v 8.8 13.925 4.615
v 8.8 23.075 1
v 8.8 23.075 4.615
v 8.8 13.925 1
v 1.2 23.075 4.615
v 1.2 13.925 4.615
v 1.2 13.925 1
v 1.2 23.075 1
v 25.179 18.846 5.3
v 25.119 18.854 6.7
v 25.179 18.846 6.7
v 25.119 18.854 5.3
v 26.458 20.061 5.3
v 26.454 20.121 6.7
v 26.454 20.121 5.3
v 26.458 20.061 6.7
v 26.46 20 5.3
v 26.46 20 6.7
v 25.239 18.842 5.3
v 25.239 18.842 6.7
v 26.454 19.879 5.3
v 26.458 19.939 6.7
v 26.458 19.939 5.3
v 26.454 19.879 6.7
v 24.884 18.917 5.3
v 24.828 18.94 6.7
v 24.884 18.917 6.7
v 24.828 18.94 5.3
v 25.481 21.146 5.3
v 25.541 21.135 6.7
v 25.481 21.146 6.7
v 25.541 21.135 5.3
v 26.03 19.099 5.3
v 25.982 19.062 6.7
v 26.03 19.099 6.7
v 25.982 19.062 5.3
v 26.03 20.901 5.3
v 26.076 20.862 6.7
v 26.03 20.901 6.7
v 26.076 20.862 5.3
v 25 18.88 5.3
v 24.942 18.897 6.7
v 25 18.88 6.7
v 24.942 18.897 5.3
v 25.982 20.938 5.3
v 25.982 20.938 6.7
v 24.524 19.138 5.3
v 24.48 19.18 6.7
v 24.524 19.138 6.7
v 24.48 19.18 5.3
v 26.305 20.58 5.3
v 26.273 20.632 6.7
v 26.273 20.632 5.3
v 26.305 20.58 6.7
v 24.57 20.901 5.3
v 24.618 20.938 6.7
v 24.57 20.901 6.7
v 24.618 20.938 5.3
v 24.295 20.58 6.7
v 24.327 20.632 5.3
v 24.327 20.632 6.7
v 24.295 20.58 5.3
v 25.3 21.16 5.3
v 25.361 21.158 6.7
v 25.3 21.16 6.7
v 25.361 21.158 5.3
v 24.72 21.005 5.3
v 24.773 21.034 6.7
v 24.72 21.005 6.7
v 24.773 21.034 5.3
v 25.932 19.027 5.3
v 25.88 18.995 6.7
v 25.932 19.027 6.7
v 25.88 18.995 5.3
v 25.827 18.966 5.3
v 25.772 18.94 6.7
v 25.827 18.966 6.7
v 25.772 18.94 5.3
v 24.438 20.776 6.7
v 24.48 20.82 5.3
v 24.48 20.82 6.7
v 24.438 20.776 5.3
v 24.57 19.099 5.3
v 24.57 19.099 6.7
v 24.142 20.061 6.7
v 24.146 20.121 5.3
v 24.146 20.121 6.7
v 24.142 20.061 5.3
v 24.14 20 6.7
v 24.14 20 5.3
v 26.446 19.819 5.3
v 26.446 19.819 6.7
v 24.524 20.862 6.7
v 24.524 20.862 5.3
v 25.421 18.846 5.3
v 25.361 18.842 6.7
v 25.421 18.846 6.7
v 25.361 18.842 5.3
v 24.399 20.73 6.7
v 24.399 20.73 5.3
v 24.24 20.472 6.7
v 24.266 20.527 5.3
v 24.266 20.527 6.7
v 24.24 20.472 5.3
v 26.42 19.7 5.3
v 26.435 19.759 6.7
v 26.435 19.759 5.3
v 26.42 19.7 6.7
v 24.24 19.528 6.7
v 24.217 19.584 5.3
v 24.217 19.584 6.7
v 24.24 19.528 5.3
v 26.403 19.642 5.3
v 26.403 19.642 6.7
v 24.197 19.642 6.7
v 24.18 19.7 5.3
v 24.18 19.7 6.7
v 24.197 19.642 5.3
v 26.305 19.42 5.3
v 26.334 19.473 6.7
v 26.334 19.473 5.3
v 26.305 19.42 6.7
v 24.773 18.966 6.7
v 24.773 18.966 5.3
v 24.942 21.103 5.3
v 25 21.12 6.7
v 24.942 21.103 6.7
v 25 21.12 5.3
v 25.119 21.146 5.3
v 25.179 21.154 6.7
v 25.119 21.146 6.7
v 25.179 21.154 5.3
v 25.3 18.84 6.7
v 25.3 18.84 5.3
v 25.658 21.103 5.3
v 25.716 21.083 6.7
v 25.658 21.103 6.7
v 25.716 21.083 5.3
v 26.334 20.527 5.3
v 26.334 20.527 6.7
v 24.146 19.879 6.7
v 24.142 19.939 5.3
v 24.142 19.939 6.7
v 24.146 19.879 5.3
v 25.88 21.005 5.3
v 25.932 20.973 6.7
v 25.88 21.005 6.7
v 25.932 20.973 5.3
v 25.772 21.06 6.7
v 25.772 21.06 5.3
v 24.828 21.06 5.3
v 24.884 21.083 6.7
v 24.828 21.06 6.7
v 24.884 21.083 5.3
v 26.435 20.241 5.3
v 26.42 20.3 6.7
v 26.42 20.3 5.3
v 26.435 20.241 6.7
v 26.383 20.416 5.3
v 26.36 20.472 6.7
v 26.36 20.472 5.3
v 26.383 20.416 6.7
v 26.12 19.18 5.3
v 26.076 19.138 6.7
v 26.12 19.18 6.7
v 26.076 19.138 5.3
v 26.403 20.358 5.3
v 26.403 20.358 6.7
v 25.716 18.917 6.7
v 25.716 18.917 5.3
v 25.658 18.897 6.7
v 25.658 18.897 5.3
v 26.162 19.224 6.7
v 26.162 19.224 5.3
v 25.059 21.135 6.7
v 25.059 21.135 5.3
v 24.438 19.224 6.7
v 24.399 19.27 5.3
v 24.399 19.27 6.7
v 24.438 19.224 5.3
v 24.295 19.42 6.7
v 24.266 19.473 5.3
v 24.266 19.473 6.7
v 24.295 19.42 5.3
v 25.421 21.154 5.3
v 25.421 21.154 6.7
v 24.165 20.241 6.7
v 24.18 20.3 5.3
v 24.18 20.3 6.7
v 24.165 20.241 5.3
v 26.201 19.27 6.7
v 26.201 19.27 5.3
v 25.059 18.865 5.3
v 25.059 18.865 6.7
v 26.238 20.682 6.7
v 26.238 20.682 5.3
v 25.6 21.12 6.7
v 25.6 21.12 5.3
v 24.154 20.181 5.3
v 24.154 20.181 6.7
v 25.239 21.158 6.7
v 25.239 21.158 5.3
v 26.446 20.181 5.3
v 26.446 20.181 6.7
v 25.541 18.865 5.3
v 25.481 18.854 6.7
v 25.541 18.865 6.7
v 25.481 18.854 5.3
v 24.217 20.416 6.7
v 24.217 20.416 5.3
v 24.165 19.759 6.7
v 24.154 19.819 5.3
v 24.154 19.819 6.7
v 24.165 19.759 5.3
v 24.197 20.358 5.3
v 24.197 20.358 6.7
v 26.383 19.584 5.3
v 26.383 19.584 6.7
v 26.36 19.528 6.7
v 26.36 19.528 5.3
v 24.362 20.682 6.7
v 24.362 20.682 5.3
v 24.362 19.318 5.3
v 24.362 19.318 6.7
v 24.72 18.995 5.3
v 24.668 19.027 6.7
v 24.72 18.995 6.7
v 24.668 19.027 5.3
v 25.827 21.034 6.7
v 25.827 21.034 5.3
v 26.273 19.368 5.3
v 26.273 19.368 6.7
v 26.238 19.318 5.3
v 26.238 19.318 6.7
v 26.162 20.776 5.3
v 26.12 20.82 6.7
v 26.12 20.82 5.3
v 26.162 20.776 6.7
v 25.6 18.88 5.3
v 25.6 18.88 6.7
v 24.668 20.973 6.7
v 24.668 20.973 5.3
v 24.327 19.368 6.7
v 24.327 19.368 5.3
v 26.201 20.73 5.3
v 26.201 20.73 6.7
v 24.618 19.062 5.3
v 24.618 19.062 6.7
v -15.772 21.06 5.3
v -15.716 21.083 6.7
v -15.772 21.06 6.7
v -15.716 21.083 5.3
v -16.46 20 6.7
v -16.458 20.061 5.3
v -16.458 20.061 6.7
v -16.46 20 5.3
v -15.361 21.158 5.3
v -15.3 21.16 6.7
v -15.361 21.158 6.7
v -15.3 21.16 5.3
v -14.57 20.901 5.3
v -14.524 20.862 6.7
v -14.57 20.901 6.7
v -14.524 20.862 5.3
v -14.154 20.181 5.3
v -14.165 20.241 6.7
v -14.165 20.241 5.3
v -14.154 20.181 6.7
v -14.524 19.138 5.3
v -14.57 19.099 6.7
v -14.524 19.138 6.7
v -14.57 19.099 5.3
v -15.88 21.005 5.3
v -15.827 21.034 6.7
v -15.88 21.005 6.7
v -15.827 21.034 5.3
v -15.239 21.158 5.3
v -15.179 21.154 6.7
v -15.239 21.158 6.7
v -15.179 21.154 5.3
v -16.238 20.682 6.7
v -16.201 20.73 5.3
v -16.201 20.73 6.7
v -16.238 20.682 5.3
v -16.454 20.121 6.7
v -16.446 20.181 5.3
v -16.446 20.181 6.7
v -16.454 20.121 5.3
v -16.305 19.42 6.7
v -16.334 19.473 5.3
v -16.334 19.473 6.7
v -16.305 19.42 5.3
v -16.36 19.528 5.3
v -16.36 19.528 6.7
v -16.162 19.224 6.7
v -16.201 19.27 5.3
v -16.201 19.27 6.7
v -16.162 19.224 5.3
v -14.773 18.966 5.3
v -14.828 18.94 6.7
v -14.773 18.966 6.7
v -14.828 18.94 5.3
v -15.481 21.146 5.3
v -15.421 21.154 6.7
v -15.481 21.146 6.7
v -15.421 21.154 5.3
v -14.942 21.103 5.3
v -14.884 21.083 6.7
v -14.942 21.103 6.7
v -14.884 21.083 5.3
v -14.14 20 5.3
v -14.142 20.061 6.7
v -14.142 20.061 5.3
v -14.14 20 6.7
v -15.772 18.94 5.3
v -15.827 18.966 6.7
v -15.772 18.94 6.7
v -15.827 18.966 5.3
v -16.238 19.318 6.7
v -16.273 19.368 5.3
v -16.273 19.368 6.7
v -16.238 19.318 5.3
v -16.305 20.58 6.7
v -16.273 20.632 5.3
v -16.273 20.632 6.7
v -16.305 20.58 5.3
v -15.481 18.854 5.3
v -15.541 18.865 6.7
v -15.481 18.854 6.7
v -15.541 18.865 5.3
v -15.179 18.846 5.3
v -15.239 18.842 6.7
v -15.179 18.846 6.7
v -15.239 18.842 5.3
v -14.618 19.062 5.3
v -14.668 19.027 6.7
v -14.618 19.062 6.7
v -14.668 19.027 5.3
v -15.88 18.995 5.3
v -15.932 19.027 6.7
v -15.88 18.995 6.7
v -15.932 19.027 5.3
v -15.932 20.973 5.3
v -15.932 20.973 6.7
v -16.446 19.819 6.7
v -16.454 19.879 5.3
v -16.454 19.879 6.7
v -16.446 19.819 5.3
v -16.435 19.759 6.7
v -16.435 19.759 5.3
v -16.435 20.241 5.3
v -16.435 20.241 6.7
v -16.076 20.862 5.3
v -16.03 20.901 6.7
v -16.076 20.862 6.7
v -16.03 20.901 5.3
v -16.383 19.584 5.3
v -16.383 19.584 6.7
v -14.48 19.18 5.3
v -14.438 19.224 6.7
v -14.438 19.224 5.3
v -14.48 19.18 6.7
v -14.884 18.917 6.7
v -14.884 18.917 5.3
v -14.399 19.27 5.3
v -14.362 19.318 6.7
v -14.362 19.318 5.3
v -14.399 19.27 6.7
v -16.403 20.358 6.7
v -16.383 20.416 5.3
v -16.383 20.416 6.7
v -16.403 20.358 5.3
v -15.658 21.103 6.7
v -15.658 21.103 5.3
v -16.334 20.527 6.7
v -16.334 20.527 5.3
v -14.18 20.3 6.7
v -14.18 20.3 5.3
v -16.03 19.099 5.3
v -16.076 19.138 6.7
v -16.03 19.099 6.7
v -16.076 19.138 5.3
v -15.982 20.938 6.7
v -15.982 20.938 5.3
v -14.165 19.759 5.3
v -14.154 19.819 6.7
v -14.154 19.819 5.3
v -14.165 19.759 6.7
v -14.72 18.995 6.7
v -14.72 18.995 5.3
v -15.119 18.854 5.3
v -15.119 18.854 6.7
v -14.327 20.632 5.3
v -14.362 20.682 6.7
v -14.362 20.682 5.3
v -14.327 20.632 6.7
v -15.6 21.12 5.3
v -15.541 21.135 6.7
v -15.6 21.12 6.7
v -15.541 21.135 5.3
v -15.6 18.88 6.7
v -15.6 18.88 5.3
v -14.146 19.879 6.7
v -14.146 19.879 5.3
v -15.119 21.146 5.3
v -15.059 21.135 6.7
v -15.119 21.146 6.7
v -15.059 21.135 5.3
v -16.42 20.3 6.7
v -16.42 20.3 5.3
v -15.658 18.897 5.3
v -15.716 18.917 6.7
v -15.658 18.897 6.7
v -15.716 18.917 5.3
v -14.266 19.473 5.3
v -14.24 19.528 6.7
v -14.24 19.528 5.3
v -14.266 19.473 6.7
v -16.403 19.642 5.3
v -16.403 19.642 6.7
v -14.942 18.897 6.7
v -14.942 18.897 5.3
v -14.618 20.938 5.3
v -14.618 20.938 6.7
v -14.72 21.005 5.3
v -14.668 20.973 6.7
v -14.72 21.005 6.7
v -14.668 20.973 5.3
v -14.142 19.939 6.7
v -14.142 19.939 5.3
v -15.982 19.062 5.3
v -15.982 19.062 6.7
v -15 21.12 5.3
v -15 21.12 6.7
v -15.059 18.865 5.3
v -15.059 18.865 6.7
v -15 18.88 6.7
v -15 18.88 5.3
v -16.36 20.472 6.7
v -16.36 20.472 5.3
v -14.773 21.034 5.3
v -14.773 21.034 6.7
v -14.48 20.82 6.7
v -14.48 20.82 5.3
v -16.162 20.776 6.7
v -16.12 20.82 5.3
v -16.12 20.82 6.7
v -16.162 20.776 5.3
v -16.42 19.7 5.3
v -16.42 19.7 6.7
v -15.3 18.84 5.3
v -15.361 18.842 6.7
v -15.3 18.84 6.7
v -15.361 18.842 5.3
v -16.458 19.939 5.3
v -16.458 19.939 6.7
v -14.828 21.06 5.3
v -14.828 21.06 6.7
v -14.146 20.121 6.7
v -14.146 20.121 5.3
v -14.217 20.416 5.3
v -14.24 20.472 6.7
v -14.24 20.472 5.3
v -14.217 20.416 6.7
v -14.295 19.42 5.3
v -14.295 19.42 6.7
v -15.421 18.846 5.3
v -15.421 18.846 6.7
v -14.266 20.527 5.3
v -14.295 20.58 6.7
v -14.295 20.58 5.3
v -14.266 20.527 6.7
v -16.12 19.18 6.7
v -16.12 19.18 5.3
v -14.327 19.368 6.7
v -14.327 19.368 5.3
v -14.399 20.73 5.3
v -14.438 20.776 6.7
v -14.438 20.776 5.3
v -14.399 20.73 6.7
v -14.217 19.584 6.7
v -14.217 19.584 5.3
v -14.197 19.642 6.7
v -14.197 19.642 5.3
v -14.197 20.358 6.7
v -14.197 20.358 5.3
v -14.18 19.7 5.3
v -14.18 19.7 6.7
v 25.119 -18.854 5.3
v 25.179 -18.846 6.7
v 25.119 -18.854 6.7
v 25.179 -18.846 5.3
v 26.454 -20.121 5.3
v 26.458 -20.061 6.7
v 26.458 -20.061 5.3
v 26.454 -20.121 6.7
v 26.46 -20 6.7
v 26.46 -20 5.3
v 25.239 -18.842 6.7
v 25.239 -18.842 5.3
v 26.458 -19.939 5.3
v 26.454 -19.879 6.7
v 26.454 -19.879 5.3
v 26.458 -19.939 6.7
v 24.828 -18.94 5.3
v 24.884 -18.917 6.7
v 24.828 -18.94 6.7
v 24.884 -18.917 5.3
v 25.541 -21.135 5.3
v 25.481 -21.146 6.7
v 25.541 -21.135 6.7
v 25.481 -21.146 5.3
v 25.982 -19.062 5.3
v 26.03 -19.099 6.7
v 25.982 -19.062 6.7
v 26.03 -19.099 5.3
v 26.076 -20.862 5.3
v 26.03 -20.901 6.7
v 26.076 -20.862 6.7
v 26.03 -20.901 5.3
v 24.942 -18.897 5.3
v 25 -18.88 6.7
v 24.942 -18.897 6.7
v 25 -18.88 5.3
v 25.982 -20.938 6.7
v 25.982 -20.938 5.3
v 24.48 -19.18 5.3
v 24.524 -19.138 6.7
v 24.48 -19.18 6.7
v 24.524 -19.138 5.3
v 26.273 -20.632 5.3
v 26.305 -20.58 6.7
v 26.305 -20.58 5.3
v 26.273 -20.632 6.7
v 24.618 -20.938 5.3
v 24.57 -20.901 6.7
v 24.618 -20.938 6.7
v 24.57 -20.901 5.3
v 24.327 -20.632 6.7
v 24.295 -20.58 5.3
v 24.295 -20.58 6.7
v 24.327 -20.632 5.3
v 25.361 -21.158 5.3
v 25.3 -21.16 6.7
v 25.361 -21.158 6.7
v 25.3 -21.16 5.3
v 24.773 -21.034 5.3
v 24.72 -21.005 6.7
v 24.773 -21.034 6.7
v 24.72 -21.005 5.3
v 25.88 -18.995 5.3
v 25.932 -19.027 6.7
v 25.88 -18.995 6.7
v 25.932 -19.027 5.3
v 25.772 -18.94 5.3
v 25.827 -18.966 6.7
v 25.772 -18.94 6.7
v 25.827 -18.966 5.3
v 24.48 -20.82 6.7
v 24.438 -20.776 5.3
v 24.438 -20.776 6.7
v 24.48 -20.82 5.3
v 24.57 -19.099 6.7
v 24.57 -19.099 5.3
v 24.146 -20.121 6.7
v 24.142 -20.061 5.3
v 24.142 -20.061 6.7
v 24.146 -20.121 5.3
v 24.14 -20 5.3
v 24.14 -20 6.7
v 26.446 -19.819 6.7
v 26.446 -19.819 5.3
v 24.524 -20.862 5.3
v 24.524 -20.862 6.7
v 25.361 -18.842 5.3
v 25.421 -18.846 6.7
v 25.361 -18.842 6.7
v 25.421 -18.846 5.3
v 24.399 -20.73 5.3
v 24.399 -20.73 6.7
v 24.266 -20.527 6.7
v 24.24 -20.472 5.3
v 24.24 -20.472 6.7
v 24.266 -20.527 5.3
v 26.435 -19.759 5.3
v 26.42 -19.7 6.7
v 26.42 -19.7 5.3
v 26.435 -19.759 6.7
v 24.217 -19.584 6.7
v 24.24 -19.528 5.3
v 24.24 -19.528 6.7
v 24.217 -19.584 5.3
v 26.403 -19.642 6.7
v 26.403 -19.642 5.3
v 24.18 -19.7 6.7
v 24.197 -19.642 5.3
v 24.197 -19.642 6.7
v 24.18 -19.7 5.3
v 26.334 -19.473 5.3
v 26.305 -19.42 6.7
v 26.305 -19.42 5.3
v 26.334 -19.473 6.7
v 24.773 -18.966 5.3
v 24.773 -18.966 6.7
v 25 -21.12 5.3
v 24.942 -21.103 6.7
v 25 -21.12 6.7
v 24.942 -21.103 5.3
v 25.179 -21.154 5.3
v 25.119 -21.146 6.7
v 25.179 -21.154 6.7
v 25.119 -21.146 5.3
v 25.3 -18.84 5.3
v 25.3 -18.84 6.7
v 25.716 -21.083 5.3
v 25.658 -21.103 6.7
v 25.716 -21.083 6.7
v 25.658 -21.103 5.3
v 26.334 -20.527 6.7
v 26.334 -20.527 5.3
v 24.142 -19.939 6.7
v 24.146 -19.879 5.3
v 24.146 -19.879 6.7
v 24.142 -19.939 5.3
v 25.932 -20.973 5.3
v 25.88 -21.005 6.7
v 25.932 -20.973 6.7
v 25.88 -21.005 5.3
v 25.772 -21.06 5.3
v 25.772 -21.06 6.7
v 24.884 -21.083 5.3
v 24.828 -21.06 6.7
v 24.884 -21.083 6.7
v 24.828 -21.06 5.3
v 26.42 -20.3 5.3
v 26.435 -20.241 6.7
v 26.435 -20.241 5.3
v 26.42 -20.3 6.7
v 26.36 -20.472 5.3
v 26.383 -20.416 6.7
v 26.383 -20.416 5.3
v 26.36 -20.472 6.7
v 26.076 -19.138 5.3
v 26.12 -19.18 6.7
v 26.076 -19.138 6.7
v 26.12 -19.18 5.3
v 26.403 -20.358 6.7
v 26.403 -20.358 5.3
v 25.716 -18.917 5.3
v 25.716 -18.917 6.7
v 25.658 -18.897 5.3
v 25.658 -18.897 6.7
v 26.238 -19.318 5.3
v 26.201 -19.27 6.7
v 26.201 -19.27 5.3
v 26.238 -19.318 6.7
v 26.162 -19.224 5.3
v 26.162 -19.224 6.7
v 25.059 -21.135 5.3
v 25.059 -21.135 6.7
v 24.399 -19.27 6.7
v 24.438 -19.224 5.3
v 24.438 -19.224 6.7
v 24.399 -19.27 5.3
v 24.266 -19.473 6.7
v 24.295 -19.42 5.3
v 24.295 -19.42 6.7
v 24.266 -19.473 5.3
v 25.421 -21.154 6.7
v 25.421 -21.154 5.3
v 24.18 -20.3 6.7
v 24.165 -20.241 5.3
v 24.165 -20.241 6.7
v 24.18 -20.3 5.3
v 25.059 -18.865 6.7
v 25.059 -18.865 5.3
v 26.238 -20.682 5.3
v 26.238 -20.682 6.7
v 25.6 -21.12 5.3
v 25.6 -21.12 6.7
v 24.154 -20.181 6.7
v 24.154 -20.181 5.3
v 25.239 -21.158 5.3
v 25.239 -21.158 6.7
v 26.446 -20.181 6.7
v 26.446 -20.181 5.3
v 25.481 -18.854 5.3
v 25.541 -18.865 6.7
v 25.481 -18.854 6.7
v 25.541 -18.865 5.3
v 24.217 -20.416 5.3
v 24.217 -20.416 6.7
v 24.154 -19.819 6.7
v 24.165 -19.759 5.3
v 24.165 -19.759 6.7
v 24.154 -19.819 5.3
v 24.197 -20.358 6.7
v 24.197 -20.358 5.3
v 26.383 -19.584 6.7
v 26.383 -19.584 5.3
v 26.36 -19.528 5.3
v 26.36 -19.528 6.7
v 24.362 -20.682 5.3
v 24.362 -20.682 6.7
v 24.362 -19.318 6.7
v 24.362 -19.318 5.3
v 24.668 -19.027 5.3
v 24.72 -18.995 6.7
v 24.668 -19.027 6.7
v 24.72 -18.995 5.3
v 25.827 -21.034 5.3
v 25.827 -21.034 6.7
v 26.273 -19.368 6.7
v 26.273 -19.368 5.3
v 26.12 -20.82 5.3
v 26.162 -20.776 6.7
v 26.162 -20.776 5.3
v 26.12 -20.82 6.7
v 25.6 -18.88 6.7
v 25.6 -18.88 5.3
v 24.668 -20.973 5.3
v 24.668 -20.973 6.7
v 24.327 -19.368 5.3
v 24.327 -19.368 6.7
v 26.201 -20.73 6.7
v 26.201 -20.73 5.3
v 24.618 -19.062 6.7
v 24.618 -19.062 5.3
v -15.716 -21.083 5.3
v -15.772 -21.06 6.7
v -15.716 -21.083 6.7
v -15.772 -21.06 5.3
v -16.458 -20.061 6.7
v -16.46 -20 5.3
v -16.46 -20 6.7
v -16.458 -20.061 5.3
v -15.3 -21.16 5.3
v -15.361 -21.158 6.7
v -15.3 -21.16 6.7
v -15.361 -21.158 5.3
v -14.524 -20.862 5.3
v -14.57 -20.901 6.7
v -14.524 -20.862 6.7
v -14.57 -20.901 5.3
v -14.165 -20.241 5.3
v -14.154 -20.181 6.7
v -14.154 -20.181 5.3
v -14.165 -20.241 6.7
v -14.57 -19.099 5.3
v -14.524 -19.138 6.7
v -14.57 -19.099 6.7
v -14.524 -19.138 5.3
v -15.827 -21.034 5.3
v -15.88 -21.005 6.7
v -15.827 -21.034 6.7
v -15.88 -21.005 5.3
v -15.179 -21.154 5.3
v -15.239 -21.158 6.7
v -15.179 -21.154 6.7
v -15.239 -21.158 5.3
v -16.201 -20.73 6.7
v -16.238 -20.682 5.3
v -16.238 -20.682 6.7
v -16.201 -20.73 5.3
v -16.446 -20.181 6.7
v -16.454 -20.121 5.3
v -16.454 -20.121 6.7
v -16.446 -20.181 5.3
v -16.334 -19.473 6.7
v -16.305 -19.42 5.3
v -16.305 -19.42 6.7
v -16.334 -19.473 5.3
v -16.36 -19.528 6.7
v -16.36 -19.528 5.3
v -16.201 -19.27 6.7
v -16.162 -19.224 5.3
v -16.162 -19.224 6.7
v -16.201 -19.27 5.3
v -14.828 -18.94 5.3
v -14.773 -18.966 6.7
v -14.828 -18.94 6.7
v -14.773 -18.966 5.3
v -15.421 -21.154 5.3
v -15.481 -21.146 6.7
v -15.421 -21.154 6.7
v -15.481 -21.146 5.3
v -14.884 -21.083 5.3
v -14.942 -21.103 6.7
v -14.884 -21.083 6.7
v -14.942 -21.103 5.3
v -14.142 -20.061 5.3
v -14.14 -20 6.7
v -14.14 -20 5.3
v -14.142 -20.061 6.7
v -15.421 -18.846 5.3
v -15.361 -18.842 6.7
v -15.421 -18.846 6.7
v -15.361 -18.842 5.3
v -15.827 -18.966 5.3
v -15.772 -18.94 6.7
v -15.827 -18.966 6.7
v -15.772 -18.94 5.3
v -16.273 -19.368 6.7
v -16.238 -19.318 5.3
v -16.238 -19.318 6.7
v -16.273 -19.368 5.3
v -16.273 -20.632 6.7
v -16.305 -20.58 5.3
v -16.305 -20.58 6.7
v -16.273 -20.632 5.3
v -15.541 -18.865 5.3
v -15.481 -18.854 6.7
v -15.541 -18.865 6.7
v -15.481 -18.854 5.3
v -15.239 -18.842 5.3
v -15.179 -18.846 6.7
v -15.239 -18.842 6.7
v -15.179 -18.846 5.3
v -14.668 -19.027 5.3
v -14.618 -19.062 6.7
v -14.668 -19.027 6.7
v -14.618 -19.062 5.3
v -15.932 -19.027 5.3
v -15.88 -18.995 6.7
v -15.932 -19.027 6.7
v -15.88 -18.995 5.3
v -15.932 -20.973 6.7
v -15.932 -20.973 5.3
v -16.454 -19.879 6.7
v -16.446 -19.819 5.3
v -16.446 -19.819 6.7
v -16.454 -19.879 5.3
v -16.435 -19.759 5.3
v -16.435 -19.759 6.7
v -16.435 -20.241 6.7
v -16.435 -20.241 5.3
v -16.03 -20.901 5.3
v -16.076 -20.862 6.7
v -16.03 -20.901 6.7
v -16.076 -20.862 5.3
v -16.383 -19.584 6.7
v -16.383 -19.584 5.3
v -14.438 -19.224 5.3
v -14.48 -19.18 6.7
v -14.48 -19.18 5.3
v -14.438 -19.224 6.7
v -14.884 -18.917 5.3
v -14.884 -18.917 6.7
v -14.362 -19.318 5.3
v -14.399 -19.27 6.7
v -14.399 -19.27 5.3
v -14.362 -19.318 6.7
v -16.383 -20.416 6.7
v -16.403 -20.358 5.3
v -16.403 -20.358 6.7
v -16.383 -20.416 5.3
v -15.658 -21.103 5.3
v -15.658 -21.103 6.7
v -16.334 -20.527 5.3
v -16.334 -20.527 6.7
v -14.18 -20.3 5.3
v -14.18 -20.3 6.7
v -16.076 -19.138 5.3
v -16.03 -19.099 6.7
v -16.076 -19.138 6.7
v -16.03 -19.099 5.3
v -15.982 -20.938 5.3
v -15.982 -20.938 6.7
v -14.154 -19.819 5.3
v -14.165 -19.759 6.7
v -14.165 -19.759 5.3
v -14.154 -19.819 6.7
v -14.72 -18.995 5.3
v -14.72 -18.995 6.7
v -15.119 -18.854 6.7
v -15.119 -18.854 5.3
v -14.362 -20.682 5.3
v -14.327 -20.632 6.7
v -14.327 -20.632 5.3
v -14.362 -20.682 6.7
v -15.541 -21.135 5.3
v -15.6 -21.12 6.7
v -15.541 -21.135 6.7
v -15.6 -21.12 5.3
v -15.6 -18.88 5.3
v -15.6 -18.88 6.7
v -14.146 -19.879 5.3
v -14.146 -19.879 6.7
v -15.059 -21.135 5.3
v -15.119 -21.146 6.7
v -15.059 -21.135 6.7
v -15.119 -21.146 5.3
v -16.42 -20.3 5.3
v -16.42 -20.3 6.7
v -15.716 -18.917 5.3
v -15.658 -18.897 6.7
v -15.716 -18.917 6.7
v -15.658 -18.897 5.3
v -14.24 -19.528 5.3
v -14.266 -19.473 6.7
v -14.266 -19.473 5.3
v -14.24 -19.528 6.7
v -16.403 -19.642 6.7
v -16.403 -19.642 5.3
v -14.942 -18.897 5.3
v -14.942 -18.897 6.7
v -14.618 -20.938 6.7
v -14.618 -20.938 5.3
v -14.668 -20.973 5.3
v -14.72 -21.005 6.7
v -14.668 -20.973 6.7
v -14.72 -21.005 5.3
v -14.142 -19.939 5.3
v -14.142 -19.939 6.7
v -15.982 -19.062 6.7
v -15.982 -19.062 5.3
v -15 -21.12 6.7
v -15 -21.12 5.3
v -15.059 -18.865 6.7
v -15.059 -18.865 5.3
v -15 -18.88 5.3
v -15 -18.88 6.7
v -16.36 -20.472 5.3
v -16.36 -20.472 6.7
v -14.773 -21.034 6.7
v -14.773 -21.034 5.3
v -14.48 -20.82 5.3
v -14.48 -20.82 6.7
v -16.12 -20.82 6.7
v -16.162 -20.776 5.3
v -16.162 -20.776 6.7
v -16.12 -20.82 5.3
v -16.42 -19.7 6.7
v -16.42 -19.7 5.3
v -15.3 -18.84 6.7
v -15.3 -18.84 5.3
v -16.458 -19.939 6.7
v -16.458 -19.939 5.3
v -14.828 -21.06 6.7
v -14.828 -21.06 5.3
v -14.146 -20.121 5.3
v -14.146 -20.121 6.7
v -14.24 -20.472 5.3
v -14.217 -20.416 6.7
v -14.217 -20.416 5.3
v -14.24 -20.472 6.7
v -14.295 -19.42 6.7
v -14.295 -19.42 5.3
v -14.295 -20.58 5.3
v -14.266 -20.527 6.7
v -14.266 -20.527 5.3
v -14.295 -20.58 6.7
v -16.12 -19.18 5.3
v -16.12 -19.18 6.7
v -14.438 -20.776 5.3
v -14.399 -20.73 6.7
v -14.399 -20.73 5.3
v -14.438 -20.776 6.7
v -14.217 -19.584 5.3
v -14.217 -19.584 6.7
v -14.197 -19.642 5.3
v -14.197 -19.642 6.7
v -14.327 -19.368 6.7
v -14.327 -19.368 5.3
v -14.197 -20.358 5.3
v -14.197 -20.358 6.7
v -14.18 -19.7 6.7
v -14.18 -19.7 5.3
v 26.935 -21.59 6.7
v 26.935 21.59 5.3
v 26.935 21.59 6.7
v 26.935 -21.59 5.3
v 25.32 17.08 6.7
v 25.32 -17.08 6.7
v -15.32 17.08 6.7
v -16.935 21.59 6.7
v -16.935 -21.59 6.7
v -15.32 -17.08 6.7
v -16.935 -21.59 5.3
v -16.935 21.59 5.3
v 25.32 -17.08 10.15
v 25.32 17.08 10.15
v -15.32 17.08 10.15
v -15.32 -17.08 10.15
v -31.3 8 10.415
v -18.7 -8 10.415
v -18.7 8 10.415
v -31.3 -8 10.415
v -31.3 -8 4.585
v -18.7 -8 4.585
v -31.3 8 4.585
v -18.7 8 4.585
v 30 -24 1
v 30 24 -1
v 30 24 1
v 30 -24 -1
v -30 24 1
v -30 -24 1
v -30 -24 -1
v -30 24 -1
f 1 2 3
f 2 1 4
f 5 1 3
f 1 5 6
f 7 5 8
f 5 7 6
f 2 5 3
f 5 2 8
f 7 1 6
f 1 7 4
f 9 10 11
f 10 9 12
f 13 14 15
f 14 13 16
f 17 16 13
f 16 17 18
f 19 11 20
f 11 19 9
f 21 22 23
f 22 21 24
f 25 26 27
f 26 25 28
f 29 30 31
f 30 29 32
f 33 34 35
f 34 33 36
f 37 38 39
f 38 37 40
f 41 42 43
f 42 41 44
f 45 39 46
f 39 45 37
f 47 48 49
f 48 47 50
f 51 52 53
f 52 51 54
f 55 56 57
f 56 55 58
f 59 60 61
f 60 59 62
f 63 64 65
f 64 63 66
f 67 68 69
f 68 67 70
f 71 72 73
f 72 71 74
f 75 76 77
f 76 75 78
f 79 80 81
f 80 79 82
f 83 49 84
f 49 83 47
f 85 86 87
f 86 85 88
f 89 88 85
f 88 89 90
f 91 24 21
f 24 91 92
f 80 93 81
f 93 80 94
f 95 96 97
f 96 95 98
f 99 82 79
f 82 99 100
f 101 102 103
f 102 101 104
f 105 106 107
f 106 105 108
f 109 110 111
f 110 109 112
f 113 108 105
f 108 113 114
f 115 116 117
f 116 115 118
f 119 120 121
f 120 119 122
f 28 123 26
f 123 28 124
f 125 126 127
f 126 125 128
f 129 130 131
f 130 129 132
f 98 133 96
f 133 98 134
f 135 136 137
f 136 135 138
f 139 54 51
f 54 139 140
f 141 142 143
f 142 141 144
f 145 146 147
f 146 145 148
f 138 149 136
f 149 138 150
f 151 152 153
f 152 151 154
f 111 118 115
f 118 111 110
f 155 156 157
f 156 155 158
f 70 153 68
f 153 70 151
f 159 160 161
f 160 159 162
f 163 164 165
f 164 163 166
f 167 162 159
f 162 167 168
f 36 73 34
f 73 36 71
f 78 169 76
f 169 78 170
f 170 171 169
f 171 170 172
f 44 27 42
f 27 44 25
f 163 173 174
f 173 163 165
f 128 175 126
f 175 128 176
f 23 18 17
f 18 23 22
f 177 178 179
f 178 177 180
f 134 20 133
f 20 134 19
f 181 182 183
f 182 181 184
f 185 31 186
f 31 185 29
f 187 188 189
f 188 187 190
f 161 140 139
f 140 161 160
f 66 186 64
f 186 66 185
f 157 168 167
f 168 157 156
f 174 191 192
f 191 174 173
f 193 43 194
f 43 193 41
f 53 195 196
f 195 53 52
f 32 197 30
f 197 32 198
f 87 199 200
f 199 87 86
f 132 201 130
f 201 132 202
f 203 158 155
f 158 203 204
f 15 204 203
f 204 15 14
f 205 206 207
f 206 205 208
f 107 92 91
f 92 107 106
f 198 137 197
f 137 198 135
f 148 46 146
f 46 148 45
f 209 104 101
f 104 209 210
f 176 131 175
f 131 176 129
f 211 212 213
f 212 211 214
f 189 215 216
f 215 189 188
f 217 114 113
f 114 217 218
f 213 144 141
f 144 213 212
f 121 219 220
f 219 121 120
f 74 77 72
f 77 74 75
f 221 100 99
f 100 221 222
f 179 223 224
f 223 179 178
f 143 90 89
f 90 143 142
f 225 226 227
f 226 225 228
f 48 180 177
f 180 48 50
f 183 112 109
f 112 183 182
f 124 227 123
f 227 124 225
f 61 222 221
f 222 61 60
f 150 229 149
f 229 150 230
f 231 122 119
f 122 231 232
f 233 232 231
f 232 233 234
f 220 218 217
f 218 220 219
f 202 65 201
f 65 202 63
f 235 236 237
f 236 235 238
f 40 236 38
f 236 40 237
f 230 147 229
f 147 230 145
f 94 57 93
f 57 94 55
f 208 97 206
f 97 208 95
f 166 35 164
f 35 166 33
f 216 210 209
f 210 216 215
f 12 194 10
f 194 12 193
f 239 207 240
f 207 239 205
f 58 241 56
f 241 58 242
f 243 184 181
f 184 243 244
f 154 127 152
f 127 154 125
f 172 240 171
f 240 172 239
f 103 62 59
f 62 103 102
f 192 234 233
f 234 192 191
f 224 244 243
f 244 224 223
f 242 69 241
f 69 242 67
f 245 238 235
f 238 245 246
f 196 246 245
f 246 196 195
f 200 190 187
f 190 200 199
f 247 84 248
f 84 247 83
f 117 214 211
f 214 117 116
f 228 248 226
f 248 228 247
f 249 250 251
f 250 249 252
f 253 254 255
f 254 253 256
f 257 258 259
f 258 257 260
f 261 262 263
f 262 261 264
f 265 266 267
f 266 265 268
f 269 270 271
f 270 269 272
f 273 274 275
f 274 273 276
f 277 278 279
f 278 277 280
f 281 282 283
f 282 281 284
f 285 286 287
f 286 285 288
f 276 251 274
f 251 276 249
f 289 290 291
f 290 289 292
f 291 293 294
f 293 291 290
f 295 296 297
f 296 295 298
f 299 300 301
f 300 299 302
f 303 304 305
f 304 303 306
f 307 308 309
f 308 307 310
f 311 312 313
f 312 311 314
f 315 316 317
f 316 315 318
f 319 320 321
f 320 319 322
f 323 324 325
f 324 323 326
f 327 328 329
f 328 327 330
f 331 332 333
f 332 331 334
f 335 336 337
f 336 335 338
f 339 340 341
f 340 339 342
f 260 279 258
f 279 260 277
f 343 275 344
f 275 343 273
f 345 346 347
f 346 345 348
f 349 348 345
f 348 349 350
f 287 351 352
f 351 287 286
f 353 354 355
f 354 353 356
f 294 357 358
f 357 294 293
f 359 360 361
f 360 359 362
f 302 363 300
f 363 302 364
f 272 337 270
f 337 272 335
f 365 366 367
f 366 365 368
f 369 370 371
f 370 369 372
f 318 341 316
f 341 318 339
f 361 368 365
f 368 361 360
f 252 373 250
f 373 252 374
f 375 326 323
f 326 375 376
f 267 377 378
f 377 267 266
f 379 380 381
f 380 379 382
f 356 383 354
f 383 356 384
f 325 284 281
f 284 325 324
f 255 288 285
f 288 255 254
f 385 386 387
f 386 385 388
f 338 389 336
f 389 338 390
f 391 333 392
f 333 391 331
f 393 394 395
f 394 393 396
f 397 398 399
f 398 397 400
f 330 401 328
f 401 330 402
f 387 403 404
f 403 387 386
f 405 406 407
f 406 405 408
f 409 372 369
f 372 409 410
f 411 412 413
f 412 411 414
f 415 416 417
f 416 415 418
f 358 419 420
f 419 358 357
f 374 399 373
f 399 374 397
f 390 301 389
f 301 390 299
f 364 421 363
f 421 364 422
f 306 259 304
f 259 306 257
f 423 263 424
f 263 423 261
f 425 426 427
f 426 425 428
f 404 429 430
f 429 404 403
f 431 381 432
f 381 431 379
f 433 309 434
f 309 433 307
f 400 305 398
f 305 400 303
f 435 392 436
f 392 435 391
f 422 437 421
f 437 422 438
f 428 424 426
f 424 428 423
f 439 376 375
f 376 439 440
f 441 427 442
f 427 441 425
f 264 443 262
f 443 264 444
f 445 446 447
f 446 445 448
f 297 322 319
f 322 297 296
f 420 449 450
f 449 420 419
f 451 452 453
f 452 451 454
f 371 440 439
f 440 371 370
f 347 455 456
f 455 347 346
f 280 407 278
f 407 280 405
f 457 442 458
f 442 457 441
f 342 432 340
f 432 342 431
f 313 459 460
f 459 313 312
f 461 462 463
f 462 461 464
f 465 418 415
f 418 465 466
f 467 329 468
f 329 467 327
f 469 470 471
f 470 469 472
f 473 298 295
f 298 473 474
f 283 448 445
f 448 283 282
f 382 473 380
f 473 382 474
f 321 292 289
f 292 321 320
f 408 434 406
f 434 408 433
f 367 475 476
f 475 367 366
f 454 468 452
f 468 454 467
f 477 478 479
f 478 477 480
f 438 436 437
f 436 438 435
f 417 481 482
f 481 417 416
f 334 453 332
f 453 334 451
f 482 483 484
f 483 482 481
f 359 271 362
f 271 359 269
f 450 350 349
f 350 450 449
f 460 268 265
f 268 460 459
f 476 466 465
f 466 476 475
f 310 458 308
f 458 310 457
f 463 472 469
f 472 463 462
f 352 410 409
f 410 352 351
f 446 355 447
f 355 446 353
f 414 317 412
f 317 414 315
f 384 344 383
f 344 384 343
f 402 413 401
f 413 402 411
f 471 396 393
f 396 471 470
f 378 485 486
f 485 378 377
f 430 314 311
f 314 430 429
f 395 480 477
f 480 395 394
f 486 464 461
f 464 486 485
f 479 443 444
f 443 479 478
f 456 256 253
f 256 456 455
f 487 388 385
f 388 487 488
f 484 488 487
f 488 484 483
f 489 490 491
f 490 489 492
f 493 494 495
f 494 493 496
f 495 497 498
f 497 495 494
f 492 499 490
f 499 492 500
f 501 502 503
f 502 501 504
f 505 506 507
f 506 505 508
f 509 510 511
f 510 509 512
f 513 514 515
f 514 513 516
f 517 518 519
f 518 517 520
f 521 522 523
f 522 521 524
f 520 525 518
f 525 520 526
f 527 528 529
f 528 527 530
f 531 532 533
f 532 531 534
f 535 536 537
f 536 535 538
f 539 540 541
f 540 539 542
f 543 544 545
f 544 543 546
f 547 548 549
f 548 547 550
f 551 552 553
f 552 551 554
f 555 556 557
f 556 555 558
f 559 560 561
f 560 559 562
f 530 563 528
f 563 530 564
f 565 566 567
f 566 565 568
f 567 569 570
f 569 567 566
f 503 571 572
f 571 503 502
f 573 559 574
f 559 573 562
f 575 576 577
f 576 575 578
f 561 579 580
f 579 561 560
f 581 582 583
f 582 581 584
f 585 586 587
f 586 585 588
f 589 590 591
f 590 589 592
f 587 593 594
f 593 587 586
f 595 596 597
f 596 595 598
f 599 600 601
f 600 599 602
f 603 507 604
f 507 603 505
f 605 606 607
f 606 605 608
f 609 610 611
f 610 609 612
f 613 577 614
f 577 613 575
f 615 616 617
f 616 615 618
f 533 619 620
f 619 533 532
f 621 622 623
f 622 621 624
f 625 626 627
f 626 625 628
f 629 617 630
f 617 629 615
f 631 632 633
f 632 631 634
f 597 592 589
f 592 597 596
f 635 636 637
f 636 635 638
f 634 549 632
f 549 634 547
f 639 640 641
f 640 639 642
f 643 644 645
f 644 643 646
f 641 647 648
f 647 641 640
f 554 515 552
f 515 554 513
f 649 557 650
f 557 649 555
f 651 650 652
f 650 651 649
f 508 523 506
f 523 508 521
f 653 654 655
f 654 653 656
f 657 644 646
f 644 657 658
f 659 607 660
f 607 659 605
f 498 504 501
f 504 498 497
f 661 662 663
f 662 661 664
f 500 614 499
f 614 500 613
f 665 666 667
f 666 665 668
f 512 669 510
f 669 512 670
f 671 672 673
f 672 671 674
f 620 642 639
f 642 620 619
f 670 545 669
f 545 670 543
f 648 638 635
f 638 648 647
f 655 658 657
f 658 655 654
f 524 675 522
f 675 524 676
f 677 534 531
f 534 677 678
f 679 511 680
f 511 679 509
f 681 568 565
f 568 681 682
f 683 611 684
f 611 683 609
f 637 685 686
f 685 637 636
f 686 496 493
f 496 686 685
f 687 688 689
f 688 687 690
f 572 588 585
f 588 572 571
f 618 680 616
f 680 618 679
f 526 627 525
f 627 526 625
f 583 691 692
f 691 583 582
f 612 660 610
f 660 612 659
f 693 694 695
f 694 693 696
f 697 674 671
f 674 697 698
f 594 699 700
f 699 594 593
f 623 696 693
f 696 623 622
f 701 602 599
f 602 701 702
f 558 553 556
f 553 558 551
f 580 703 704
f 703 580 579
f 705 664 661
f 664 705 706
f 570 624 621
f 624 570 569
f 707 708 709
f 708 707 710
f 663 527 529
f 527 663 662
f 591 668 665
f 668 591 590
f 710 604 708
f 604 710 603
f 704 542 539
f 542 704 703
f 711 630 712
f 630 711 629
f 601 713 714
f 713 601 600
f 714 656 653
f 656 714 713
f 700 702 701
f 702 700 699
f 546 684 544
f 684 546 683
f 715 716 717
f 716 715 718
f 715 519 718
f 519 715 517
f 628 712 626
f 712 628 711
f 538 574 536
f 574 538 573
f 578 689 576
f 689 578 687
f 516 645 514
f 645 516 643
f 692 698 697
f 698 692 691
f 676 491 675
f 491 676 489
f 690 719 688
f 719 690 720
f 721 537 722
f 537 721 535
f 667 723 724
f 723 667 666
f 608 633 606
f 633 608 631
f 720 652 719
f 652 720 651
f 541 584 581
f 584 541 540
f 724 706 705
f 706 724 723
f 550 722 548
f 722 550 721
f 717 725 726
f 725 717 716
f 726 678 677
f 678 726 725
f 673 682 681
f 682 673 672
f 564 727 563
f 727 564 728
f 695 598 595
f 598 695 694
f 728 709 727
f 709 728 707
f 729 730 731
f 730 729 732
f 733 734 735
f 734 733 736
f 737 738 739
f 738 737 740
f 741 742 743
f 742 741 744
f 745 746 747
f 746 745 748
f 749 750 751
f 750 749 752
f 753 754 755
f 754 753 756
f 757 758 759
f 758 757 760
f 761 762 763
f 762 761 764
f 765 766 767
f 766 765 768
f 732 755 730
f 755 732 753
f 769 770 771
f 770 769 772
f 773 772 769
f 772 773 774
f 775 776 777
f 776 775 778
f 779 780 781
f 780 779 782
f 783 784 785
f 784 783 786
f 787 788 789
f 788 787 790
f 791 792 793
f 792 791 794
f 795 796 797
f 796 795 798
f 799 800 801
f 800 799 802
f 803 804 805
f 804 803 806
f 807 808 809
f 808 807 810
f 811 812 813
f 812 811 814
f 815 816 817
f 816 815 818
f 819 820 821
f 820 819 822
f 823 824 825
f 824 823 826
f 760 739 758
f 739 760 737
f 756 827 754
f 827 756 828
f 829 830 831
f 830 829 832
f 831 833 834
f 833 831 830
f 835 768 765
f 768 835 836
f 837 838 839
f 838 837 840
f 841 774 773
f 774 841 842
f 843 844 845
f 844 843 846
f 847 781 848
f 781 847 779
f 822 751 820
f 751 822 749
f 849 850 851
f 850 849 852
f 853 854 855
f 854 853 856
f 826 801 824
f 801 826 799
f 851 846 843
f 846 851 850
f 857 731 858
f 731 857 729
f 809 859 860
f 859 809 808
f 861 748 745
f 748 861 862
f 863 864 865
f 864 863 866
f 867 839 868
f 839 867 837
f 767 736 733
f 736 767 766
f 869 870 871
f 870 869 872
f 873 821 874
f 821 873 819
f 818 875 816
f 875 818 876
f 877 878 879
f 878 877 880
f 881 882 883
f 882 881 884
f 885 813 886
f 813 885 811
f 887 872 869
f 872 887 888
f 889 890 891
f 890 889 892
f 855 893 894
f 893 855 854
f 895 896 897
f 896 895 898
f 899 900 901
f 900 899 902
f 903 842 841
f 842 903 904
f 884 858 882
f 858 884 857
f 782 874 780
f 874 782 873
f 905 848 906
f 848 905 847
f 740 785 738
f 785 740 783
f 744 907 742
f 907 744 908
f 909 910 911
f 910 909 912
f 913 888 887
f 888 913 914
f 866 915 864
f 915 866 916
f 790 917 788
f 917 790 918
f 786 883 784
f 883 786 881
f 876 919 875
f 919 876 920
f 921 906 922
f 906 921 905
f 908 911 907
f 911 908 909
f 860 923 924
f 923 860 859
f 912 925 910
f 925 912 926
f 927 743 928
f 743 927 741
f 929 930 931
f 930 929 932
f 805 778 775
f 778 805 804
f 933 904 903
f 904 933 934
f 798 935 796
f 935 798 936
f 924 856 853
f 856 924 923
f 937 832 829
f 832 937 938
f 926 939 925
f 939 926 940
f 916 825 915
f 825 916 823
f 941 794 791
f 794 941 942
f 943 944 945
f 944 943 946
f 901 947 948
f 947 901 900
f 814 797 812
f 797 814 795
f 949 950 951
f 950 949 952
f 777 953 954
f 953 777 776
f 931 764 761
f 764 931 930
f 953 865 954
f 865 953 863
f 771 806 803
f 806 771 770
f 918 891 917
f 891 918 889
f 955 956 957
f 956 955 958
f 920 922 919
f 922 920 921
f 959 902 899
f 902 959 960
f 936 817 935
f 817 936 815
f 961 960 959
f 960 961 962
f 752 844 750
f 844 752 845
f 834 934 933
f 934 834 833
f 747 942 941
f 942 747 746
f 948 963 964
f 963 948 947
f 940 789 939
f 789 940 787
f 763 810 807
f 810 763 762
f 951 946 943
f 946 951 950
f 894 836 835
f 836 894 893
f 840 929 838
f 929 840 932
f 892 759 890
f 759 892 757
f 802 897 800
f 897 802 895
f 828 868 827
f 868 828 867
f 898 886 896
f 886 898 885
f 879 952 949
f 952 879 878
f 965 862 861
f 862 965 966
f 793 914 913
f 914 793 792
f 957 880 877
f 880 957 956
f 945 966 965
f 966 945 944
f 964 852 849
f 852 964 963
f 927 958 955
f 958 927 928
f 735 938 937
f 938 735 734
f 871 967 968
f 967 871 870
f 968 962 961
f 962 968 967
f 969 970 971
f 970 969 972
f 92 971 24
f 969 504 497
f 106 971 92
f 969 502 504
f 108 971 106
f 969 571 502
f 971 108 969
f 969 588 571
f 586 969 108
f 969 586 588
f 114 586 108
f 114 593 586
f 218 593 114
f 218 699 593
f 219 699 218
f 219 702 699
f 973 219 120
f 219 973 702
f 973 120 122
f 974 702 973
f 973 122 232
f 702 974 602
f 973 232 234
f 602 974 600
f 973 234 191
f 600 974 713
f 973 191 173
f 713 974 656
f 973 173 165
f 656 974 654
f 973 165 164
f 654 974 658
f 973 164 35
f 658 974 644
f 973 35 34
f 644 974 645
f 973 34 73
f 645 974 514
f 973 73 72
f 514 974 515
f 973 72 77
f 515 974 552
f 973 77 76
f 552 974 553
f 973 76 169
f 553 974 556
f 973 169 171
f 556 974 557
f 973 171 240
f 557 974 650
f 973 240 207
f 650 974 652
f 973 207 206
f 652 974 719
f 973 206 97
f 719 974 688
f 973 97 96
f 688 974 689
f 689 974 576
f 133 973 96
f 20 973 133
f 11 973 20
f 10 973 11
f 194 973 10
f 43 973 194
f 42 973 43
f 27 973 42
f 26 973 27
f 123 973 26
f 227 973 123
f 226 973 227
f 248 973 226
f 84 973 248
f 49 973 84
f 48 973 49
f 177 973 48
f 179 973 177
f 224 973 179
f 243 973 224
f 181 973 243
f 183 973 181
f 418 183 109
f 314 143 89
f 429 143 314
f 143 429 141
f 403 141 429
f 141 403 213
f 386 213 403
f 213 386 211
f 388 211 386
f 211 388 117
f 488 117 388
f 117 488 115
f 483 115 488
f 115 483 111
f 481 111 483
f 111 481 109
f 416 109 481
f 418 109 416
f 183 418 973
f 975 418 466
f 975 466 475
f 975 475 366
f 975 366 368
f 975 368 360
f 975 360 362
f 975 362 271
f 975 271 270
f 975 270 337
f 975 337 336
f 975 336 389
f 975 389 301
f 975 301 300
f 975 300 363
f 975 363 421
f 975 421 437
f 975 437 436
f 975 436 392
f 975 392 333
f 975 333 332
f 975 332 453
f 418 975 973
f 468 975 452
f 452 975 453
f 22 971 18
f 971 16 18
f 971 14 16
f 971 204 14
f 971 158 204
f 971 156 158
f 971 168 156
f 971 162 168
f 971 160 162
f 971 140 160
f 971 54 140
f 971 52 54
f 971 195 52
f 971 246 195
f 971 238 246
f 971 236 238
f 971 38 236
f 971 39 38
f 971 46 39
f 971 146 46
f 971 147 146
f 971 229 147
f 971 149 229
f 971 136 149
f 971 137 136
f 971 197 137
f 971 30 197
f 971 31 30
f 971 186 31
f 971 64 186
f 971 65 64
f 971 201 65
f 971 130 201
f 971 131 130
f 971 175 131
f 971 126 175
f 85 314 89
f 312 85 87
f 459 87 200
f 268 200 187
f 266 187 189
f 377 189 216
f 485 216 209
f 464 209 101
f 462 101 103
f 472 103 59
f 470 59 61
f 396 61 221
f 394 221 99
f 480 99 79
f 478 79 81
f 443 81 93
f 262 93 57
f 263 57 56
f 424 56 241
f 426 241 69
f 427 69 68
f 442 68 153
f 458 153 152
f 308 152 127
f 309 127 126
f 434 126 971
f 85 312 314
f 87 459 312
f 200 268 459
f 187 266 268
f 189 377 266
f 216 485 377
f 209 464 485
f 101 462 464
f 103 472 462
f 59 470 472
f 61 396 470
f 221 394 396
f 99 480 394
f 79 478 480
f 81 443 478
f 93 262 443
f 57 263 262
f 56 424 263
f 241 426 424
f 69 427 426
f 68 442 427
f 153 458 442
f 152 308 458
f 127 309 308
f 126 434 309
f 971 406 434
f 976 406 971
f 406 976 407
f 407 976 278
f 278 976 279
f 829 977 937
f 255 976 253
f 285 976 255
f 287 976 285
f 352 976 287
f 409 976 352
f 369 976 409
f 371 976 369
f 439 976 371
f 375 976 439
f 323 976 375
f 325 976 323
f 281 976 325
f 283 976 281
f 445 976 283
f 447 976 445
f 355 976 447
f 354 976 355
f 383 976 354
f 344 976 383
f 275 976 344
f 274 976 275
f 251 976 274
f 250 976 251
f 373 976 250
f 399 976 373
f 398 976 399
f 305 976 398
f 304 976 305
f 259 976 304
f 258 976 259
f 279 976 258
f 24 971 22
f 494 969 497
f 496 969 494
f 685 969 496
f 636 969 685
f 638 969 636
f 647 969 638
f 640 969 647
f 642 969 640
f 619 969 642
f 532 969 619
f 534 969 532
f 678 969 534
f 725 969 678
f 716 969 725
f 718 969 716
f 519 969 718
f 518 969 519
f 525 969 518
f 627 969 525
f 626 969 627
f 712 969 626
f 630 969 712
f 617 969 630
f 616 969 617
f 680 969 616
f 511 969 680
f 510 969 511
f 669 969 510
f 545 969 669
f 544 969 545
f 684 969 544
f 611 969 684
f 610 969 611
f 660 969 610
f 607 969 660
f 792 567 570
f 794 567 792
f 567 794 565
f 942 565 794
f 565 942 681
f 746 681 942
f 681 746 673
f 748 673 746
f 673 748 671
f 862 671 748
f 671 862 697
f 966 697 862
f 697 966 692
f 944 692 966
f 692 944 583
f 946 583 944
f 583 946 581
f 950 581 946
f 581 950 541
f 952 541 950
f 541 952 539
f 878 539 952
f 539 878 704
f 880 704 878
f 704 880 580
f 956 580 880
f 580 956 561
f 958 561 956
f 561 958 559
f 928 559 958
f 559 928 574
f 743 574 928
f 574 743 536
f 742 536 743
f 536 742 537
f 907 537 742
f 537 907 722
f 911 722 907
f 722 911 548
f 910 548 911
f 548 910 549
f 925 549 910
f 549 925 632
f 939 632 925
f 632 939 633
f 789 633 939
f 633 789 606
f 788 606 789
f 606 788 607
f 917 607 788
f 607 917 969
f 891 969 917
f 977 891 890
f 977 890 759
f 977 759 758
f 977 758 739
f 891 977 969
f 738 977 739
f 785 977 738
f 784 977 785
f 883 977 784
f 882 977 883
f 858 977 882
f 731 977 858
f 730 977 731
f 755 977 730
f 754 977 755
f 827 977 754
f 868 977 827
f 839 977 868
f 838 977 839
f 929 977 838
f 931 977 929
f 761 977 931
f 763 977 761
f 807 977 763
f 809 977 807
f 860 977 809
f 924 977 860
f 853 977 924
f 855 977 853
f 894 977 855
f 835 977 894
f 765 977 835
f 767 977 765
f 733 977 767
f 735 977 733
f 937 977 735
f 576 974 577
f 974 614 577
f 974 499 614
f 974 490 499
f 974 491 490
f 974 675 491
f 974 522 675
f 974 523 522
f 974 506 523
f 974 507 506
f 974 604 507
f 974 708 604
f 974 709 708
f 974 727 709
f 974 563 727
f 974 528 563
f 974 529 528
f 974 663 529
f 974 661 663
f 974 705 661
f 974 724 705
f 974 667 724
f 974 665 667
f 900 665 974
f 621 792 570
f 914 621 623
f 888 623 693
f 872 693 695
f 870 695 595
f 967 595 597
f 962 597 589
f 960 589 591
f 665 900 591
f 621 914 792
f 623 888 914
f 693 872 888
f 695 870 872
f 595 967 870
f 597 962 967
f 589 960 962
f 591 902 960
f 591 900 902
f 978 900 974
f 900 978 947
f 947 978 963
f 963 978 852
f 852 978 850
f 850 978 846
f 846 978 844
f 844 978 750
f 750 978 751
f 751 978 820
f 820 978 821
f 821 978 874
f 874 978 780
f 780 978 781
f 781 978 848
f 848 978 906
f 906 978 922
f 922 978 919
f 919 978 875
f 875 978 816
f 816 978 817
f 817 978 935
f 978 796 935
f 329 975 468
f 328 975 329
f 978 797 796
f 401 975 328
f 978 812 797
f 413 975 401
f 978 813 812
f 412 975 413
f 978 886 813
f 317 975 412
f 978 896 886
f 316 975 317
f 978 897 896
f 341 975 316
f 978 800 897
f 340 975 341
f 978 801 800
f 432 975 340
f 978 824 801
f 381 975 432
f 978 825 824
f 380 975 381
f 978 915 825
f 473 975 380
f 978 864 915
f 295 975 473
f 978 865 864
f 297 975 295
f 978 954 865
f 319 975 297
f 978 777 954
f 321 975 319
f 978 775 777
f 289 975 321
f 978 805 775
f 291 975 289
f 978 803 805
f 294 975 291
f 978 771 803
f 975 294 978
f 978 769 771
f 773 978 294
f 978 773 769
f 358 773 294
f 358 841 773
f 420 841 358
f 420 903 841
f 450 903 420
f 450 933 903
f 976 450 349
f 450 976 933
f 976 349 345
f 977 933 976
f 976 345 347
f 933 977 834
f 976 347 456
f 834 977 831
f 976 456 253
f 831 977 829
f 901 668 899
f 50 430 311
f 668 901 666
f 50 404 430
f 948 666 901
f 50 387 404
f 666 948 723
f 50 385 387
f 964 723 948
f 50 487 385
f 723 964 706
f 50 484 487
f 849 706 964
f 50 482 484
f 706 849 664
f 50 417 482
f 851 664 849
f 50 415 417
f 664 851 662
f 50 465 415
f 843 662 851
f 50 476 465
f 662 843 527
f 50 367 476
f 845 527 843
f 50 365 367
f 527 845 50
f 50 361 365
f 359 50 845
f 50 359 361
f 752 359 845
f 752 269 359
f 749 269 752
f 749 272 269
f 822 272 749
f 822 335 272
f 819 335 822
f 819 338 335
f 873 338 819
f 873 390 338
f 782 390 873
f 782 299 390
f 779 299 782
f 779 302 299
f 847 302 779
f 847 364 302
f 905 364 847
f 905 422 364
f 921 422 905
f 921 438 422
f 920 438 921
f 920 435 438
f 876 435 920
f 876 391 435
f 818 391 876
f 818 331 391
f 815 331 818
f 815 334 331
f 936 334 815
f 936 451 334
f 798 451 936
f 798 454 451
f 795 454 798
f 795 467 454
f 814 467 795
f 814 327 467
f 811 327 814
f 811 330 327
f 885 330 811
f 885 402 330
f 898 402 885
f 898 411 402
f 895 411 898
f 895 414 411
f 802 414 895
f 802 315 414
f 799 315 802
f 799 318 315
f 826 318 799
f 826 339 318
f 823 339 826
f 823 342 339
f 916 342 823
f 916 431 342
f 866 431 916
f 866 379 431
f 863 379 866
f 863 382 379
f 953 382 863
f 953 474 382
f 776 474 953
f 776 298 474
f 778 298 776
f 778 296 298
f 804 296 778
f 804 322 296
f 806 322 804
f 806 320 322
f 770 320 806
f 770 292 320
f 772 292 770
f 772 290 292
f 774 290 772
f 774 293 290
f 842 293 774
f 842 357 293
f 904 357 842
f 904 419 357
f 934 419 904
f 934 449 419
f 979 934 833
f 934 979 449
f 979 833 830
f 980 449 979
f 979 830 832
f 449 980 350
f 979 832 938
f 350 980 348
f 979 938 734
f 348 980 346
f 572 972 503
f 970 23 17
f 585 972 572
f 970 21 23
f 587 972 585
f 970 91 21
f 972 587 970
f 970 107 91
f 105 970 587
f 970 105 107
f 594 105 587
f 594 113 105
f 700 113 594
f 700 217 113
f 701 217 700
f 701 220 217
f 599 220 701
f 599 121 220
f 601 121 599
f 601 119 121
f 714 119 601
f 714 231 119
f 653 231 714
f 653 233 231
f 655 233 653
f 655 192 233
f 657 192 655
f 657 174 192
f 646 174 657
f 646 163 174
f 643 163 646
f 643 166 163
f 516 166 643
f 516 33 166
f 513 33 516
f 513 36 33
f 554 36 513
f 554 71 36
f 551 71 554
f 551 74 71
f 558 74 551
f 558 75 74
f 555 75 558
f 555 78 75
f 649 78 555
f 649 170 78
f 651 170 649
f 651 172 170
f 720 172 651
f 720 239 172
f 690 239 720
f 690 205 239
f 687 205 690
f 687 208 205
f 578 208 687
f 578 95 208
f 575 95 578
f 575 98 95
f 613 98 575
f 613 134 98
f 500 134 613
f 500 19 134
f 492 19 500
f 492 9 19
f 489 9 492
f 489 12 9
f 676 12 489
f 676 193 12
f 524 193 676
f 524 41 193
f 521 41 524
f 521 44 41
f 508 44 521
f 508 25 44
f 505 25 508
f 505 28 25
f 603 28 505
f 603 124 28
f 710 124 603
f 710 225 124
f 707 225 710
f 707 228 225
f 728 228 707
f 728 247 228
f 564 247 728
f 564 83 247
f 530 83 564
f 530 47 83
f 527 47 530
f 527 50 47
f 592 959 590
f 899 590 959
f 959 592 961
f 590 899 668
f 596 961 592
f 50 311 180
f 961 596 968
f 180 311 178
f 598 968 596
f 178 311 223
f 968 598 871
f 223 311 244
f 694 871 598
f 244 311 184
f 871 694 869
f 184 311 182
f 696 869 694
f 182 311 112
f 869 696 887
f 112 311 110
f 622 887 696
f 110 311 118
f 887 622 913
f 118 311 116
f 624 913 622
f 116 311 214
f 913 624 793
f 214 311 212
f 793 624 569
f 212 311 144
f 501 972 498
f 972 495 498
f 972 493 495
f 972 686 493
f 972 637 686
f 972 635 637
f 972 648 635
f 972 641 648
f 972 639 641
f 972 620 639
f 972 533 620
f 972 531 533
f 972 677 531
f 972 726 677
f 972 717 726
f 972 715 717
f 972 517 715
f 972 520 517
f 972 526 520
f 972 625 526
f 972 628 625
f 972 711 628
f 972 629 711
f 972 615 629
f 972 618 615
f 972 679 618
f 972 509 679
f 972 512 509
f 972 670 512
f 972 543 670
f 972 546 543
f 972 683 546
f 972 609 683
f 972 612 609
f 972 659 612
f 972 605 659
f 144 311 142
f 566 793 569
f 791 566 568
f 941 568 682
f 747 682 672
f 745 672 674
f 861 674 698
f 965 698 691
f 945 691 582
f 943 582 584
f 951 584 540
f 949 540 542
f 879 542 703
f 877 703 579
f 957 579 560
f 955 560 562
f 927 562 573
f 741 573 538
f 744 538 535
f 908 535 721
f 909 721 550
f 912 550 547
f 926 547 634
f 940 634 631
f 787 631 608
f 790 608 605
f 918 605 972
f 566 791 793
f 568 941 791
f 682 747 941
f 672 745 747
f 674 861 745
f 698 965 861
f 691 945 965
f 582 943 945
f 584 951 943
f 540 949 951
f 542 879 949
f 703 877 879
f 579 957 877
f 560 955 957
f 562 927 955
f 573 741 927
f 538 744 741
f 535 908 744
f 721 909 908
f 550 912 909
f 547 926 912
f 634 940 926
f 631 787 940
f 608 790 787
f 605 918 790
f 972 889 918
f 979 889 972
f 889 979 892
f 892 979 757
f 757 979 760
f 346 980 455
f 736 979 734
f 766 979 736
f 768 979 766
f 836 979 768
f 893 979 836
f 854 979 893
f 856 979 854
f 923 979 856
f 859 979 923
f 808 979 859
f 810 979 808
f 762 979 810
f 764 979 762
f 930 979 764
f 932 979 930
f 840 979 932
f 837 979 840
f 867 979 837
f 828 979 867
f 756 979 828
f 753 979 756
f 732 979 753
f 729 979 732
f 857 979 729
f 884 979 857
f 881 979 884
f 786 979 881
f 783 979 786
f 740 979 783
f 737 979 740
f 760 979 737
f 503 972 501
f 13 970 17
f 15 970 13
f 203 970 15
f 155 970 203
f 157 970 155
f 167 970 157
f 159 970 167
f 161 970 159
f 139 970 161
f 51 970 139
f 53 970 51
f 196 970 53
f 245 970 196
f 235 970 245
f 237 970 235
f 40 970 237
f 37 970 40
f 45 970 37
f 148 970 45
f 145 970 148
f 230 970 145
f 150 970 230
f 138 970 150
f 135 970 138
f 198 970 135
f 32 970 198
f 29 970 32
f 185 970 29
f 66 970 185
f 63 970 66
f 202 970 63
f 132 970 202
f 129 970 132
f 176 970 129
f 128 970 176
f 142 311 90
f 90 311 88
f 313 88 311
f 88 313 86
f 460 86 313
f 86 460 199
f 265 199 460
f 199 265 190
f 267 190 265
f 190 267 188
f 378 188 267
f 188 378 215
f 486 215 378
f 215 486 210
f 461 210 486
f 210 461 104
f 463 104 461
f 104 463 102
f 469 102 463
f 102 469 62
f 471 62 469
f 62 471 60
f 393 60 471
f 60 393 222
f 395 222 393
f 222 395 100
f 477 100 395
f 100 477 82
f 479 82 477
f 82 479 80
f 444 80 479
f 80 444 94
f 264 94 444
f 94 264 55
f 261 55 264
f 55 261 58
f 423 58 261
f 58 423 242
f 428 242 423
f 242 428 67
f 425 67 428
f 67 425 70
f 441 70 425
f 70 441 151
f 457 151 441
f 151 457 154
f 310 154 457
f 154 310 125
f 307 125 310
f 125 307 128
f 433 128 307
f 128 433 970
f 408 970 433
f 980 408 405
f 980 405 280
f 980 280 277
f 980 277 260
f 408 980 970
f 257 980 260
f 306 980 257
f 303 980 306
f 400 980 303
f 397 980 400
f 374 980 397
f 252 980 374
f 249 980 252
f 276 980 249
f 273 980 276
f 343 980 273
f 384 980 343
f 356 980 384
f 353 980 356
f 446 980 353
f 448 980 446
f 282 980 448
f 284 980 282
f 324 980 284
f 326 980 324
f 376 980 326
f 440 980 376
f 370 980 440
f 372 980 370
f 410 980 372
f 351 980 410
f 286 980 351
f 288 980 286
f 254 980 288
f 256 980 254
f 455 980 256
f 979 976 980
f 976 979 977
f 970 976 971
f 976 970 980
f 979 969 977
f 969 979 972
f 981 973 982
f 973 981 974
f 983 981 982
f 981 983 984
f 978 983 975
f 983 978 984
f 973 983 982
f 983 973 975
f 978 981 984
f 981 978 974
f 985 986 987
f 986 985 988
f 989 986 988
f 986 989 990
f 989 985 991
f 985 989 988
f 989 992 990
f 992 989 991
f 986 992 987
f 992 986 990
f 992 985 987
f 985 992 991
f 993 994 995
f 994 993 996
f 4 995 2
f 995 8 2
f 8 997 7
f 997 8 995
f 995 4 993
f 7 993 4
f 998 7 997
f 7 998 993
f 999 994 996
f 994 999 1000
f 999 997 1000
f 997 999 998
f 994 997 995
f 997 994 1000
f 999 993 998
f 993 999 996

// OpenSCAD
// file: sensors.scad
/* nokia 5110 lcd */
module nokia5110(){
    difference() {
        cube([43.87, 43.18, 1.4], center = true);
        nokia4Hole();
    }
    translate([0,0,2.4]){
        cube([40.64, 34.16, 3.5], center = true);
    }
}

module nokiaHole(){
    translate([20.3, 20, 0]){
        cylinder(h = 2, d = 2.32, center=true, $fn=120);
    }
}

module nokia2Hole(){
    nokiaHole();
    mirror(v= [180, 0, 0] ){
        nokiaHole();
    }
}

module nokia4Hole(){
    nokia2Hole();
    mirror(v= [0, 180, 0] ){
        nokia2Hole();
    }
}

/* arduino nano v3 */
module arduinoNano(){
    difference() {
        cube([17.65, 43.40, 1.58], center = true); 
        nano4Hole();
    }
    translate([0, 18.5, 2.7]){
        cube([7.6, 9.15, 3.83], center = true); 
    }
}

module nanoHole(){
    translate([8, 20.9, 0]){
            cylinder(h = 2, d = 1.42, center=true, $fn=120);
        }
}

module nano2Hole(){
    nanoHole();
    mirror(v= [180, 0, 0] ){
        nanoHole();
    }
}

module nano4Hole(){
    nano2Hole();
    mirror(v= [0, 180, 0] ){
        nano2Hole();
    }
}

/* DHT 11 */
module dht11(){
     cube([16, 12.6, 5.83], center = true); 
}
dht11();
// main file
/* import sensors for design only */
use <sensors.scad>;

module allSensors(){
    union(){
        translate(v = [0, 0, 0]) {
            arduinoNano();
        }
        translate(v = [0, 0, 6]) {
            nokia5110();
        }

        translate(v = [-30, 0, 7.5]) {
            rotate([0, 0, 90]) {
                dht11();
            }
        }
    }
}
/* end of import */
translate(v=[5,0,0]){
    allSensors();
}
cube([60,48,2],center=true);
